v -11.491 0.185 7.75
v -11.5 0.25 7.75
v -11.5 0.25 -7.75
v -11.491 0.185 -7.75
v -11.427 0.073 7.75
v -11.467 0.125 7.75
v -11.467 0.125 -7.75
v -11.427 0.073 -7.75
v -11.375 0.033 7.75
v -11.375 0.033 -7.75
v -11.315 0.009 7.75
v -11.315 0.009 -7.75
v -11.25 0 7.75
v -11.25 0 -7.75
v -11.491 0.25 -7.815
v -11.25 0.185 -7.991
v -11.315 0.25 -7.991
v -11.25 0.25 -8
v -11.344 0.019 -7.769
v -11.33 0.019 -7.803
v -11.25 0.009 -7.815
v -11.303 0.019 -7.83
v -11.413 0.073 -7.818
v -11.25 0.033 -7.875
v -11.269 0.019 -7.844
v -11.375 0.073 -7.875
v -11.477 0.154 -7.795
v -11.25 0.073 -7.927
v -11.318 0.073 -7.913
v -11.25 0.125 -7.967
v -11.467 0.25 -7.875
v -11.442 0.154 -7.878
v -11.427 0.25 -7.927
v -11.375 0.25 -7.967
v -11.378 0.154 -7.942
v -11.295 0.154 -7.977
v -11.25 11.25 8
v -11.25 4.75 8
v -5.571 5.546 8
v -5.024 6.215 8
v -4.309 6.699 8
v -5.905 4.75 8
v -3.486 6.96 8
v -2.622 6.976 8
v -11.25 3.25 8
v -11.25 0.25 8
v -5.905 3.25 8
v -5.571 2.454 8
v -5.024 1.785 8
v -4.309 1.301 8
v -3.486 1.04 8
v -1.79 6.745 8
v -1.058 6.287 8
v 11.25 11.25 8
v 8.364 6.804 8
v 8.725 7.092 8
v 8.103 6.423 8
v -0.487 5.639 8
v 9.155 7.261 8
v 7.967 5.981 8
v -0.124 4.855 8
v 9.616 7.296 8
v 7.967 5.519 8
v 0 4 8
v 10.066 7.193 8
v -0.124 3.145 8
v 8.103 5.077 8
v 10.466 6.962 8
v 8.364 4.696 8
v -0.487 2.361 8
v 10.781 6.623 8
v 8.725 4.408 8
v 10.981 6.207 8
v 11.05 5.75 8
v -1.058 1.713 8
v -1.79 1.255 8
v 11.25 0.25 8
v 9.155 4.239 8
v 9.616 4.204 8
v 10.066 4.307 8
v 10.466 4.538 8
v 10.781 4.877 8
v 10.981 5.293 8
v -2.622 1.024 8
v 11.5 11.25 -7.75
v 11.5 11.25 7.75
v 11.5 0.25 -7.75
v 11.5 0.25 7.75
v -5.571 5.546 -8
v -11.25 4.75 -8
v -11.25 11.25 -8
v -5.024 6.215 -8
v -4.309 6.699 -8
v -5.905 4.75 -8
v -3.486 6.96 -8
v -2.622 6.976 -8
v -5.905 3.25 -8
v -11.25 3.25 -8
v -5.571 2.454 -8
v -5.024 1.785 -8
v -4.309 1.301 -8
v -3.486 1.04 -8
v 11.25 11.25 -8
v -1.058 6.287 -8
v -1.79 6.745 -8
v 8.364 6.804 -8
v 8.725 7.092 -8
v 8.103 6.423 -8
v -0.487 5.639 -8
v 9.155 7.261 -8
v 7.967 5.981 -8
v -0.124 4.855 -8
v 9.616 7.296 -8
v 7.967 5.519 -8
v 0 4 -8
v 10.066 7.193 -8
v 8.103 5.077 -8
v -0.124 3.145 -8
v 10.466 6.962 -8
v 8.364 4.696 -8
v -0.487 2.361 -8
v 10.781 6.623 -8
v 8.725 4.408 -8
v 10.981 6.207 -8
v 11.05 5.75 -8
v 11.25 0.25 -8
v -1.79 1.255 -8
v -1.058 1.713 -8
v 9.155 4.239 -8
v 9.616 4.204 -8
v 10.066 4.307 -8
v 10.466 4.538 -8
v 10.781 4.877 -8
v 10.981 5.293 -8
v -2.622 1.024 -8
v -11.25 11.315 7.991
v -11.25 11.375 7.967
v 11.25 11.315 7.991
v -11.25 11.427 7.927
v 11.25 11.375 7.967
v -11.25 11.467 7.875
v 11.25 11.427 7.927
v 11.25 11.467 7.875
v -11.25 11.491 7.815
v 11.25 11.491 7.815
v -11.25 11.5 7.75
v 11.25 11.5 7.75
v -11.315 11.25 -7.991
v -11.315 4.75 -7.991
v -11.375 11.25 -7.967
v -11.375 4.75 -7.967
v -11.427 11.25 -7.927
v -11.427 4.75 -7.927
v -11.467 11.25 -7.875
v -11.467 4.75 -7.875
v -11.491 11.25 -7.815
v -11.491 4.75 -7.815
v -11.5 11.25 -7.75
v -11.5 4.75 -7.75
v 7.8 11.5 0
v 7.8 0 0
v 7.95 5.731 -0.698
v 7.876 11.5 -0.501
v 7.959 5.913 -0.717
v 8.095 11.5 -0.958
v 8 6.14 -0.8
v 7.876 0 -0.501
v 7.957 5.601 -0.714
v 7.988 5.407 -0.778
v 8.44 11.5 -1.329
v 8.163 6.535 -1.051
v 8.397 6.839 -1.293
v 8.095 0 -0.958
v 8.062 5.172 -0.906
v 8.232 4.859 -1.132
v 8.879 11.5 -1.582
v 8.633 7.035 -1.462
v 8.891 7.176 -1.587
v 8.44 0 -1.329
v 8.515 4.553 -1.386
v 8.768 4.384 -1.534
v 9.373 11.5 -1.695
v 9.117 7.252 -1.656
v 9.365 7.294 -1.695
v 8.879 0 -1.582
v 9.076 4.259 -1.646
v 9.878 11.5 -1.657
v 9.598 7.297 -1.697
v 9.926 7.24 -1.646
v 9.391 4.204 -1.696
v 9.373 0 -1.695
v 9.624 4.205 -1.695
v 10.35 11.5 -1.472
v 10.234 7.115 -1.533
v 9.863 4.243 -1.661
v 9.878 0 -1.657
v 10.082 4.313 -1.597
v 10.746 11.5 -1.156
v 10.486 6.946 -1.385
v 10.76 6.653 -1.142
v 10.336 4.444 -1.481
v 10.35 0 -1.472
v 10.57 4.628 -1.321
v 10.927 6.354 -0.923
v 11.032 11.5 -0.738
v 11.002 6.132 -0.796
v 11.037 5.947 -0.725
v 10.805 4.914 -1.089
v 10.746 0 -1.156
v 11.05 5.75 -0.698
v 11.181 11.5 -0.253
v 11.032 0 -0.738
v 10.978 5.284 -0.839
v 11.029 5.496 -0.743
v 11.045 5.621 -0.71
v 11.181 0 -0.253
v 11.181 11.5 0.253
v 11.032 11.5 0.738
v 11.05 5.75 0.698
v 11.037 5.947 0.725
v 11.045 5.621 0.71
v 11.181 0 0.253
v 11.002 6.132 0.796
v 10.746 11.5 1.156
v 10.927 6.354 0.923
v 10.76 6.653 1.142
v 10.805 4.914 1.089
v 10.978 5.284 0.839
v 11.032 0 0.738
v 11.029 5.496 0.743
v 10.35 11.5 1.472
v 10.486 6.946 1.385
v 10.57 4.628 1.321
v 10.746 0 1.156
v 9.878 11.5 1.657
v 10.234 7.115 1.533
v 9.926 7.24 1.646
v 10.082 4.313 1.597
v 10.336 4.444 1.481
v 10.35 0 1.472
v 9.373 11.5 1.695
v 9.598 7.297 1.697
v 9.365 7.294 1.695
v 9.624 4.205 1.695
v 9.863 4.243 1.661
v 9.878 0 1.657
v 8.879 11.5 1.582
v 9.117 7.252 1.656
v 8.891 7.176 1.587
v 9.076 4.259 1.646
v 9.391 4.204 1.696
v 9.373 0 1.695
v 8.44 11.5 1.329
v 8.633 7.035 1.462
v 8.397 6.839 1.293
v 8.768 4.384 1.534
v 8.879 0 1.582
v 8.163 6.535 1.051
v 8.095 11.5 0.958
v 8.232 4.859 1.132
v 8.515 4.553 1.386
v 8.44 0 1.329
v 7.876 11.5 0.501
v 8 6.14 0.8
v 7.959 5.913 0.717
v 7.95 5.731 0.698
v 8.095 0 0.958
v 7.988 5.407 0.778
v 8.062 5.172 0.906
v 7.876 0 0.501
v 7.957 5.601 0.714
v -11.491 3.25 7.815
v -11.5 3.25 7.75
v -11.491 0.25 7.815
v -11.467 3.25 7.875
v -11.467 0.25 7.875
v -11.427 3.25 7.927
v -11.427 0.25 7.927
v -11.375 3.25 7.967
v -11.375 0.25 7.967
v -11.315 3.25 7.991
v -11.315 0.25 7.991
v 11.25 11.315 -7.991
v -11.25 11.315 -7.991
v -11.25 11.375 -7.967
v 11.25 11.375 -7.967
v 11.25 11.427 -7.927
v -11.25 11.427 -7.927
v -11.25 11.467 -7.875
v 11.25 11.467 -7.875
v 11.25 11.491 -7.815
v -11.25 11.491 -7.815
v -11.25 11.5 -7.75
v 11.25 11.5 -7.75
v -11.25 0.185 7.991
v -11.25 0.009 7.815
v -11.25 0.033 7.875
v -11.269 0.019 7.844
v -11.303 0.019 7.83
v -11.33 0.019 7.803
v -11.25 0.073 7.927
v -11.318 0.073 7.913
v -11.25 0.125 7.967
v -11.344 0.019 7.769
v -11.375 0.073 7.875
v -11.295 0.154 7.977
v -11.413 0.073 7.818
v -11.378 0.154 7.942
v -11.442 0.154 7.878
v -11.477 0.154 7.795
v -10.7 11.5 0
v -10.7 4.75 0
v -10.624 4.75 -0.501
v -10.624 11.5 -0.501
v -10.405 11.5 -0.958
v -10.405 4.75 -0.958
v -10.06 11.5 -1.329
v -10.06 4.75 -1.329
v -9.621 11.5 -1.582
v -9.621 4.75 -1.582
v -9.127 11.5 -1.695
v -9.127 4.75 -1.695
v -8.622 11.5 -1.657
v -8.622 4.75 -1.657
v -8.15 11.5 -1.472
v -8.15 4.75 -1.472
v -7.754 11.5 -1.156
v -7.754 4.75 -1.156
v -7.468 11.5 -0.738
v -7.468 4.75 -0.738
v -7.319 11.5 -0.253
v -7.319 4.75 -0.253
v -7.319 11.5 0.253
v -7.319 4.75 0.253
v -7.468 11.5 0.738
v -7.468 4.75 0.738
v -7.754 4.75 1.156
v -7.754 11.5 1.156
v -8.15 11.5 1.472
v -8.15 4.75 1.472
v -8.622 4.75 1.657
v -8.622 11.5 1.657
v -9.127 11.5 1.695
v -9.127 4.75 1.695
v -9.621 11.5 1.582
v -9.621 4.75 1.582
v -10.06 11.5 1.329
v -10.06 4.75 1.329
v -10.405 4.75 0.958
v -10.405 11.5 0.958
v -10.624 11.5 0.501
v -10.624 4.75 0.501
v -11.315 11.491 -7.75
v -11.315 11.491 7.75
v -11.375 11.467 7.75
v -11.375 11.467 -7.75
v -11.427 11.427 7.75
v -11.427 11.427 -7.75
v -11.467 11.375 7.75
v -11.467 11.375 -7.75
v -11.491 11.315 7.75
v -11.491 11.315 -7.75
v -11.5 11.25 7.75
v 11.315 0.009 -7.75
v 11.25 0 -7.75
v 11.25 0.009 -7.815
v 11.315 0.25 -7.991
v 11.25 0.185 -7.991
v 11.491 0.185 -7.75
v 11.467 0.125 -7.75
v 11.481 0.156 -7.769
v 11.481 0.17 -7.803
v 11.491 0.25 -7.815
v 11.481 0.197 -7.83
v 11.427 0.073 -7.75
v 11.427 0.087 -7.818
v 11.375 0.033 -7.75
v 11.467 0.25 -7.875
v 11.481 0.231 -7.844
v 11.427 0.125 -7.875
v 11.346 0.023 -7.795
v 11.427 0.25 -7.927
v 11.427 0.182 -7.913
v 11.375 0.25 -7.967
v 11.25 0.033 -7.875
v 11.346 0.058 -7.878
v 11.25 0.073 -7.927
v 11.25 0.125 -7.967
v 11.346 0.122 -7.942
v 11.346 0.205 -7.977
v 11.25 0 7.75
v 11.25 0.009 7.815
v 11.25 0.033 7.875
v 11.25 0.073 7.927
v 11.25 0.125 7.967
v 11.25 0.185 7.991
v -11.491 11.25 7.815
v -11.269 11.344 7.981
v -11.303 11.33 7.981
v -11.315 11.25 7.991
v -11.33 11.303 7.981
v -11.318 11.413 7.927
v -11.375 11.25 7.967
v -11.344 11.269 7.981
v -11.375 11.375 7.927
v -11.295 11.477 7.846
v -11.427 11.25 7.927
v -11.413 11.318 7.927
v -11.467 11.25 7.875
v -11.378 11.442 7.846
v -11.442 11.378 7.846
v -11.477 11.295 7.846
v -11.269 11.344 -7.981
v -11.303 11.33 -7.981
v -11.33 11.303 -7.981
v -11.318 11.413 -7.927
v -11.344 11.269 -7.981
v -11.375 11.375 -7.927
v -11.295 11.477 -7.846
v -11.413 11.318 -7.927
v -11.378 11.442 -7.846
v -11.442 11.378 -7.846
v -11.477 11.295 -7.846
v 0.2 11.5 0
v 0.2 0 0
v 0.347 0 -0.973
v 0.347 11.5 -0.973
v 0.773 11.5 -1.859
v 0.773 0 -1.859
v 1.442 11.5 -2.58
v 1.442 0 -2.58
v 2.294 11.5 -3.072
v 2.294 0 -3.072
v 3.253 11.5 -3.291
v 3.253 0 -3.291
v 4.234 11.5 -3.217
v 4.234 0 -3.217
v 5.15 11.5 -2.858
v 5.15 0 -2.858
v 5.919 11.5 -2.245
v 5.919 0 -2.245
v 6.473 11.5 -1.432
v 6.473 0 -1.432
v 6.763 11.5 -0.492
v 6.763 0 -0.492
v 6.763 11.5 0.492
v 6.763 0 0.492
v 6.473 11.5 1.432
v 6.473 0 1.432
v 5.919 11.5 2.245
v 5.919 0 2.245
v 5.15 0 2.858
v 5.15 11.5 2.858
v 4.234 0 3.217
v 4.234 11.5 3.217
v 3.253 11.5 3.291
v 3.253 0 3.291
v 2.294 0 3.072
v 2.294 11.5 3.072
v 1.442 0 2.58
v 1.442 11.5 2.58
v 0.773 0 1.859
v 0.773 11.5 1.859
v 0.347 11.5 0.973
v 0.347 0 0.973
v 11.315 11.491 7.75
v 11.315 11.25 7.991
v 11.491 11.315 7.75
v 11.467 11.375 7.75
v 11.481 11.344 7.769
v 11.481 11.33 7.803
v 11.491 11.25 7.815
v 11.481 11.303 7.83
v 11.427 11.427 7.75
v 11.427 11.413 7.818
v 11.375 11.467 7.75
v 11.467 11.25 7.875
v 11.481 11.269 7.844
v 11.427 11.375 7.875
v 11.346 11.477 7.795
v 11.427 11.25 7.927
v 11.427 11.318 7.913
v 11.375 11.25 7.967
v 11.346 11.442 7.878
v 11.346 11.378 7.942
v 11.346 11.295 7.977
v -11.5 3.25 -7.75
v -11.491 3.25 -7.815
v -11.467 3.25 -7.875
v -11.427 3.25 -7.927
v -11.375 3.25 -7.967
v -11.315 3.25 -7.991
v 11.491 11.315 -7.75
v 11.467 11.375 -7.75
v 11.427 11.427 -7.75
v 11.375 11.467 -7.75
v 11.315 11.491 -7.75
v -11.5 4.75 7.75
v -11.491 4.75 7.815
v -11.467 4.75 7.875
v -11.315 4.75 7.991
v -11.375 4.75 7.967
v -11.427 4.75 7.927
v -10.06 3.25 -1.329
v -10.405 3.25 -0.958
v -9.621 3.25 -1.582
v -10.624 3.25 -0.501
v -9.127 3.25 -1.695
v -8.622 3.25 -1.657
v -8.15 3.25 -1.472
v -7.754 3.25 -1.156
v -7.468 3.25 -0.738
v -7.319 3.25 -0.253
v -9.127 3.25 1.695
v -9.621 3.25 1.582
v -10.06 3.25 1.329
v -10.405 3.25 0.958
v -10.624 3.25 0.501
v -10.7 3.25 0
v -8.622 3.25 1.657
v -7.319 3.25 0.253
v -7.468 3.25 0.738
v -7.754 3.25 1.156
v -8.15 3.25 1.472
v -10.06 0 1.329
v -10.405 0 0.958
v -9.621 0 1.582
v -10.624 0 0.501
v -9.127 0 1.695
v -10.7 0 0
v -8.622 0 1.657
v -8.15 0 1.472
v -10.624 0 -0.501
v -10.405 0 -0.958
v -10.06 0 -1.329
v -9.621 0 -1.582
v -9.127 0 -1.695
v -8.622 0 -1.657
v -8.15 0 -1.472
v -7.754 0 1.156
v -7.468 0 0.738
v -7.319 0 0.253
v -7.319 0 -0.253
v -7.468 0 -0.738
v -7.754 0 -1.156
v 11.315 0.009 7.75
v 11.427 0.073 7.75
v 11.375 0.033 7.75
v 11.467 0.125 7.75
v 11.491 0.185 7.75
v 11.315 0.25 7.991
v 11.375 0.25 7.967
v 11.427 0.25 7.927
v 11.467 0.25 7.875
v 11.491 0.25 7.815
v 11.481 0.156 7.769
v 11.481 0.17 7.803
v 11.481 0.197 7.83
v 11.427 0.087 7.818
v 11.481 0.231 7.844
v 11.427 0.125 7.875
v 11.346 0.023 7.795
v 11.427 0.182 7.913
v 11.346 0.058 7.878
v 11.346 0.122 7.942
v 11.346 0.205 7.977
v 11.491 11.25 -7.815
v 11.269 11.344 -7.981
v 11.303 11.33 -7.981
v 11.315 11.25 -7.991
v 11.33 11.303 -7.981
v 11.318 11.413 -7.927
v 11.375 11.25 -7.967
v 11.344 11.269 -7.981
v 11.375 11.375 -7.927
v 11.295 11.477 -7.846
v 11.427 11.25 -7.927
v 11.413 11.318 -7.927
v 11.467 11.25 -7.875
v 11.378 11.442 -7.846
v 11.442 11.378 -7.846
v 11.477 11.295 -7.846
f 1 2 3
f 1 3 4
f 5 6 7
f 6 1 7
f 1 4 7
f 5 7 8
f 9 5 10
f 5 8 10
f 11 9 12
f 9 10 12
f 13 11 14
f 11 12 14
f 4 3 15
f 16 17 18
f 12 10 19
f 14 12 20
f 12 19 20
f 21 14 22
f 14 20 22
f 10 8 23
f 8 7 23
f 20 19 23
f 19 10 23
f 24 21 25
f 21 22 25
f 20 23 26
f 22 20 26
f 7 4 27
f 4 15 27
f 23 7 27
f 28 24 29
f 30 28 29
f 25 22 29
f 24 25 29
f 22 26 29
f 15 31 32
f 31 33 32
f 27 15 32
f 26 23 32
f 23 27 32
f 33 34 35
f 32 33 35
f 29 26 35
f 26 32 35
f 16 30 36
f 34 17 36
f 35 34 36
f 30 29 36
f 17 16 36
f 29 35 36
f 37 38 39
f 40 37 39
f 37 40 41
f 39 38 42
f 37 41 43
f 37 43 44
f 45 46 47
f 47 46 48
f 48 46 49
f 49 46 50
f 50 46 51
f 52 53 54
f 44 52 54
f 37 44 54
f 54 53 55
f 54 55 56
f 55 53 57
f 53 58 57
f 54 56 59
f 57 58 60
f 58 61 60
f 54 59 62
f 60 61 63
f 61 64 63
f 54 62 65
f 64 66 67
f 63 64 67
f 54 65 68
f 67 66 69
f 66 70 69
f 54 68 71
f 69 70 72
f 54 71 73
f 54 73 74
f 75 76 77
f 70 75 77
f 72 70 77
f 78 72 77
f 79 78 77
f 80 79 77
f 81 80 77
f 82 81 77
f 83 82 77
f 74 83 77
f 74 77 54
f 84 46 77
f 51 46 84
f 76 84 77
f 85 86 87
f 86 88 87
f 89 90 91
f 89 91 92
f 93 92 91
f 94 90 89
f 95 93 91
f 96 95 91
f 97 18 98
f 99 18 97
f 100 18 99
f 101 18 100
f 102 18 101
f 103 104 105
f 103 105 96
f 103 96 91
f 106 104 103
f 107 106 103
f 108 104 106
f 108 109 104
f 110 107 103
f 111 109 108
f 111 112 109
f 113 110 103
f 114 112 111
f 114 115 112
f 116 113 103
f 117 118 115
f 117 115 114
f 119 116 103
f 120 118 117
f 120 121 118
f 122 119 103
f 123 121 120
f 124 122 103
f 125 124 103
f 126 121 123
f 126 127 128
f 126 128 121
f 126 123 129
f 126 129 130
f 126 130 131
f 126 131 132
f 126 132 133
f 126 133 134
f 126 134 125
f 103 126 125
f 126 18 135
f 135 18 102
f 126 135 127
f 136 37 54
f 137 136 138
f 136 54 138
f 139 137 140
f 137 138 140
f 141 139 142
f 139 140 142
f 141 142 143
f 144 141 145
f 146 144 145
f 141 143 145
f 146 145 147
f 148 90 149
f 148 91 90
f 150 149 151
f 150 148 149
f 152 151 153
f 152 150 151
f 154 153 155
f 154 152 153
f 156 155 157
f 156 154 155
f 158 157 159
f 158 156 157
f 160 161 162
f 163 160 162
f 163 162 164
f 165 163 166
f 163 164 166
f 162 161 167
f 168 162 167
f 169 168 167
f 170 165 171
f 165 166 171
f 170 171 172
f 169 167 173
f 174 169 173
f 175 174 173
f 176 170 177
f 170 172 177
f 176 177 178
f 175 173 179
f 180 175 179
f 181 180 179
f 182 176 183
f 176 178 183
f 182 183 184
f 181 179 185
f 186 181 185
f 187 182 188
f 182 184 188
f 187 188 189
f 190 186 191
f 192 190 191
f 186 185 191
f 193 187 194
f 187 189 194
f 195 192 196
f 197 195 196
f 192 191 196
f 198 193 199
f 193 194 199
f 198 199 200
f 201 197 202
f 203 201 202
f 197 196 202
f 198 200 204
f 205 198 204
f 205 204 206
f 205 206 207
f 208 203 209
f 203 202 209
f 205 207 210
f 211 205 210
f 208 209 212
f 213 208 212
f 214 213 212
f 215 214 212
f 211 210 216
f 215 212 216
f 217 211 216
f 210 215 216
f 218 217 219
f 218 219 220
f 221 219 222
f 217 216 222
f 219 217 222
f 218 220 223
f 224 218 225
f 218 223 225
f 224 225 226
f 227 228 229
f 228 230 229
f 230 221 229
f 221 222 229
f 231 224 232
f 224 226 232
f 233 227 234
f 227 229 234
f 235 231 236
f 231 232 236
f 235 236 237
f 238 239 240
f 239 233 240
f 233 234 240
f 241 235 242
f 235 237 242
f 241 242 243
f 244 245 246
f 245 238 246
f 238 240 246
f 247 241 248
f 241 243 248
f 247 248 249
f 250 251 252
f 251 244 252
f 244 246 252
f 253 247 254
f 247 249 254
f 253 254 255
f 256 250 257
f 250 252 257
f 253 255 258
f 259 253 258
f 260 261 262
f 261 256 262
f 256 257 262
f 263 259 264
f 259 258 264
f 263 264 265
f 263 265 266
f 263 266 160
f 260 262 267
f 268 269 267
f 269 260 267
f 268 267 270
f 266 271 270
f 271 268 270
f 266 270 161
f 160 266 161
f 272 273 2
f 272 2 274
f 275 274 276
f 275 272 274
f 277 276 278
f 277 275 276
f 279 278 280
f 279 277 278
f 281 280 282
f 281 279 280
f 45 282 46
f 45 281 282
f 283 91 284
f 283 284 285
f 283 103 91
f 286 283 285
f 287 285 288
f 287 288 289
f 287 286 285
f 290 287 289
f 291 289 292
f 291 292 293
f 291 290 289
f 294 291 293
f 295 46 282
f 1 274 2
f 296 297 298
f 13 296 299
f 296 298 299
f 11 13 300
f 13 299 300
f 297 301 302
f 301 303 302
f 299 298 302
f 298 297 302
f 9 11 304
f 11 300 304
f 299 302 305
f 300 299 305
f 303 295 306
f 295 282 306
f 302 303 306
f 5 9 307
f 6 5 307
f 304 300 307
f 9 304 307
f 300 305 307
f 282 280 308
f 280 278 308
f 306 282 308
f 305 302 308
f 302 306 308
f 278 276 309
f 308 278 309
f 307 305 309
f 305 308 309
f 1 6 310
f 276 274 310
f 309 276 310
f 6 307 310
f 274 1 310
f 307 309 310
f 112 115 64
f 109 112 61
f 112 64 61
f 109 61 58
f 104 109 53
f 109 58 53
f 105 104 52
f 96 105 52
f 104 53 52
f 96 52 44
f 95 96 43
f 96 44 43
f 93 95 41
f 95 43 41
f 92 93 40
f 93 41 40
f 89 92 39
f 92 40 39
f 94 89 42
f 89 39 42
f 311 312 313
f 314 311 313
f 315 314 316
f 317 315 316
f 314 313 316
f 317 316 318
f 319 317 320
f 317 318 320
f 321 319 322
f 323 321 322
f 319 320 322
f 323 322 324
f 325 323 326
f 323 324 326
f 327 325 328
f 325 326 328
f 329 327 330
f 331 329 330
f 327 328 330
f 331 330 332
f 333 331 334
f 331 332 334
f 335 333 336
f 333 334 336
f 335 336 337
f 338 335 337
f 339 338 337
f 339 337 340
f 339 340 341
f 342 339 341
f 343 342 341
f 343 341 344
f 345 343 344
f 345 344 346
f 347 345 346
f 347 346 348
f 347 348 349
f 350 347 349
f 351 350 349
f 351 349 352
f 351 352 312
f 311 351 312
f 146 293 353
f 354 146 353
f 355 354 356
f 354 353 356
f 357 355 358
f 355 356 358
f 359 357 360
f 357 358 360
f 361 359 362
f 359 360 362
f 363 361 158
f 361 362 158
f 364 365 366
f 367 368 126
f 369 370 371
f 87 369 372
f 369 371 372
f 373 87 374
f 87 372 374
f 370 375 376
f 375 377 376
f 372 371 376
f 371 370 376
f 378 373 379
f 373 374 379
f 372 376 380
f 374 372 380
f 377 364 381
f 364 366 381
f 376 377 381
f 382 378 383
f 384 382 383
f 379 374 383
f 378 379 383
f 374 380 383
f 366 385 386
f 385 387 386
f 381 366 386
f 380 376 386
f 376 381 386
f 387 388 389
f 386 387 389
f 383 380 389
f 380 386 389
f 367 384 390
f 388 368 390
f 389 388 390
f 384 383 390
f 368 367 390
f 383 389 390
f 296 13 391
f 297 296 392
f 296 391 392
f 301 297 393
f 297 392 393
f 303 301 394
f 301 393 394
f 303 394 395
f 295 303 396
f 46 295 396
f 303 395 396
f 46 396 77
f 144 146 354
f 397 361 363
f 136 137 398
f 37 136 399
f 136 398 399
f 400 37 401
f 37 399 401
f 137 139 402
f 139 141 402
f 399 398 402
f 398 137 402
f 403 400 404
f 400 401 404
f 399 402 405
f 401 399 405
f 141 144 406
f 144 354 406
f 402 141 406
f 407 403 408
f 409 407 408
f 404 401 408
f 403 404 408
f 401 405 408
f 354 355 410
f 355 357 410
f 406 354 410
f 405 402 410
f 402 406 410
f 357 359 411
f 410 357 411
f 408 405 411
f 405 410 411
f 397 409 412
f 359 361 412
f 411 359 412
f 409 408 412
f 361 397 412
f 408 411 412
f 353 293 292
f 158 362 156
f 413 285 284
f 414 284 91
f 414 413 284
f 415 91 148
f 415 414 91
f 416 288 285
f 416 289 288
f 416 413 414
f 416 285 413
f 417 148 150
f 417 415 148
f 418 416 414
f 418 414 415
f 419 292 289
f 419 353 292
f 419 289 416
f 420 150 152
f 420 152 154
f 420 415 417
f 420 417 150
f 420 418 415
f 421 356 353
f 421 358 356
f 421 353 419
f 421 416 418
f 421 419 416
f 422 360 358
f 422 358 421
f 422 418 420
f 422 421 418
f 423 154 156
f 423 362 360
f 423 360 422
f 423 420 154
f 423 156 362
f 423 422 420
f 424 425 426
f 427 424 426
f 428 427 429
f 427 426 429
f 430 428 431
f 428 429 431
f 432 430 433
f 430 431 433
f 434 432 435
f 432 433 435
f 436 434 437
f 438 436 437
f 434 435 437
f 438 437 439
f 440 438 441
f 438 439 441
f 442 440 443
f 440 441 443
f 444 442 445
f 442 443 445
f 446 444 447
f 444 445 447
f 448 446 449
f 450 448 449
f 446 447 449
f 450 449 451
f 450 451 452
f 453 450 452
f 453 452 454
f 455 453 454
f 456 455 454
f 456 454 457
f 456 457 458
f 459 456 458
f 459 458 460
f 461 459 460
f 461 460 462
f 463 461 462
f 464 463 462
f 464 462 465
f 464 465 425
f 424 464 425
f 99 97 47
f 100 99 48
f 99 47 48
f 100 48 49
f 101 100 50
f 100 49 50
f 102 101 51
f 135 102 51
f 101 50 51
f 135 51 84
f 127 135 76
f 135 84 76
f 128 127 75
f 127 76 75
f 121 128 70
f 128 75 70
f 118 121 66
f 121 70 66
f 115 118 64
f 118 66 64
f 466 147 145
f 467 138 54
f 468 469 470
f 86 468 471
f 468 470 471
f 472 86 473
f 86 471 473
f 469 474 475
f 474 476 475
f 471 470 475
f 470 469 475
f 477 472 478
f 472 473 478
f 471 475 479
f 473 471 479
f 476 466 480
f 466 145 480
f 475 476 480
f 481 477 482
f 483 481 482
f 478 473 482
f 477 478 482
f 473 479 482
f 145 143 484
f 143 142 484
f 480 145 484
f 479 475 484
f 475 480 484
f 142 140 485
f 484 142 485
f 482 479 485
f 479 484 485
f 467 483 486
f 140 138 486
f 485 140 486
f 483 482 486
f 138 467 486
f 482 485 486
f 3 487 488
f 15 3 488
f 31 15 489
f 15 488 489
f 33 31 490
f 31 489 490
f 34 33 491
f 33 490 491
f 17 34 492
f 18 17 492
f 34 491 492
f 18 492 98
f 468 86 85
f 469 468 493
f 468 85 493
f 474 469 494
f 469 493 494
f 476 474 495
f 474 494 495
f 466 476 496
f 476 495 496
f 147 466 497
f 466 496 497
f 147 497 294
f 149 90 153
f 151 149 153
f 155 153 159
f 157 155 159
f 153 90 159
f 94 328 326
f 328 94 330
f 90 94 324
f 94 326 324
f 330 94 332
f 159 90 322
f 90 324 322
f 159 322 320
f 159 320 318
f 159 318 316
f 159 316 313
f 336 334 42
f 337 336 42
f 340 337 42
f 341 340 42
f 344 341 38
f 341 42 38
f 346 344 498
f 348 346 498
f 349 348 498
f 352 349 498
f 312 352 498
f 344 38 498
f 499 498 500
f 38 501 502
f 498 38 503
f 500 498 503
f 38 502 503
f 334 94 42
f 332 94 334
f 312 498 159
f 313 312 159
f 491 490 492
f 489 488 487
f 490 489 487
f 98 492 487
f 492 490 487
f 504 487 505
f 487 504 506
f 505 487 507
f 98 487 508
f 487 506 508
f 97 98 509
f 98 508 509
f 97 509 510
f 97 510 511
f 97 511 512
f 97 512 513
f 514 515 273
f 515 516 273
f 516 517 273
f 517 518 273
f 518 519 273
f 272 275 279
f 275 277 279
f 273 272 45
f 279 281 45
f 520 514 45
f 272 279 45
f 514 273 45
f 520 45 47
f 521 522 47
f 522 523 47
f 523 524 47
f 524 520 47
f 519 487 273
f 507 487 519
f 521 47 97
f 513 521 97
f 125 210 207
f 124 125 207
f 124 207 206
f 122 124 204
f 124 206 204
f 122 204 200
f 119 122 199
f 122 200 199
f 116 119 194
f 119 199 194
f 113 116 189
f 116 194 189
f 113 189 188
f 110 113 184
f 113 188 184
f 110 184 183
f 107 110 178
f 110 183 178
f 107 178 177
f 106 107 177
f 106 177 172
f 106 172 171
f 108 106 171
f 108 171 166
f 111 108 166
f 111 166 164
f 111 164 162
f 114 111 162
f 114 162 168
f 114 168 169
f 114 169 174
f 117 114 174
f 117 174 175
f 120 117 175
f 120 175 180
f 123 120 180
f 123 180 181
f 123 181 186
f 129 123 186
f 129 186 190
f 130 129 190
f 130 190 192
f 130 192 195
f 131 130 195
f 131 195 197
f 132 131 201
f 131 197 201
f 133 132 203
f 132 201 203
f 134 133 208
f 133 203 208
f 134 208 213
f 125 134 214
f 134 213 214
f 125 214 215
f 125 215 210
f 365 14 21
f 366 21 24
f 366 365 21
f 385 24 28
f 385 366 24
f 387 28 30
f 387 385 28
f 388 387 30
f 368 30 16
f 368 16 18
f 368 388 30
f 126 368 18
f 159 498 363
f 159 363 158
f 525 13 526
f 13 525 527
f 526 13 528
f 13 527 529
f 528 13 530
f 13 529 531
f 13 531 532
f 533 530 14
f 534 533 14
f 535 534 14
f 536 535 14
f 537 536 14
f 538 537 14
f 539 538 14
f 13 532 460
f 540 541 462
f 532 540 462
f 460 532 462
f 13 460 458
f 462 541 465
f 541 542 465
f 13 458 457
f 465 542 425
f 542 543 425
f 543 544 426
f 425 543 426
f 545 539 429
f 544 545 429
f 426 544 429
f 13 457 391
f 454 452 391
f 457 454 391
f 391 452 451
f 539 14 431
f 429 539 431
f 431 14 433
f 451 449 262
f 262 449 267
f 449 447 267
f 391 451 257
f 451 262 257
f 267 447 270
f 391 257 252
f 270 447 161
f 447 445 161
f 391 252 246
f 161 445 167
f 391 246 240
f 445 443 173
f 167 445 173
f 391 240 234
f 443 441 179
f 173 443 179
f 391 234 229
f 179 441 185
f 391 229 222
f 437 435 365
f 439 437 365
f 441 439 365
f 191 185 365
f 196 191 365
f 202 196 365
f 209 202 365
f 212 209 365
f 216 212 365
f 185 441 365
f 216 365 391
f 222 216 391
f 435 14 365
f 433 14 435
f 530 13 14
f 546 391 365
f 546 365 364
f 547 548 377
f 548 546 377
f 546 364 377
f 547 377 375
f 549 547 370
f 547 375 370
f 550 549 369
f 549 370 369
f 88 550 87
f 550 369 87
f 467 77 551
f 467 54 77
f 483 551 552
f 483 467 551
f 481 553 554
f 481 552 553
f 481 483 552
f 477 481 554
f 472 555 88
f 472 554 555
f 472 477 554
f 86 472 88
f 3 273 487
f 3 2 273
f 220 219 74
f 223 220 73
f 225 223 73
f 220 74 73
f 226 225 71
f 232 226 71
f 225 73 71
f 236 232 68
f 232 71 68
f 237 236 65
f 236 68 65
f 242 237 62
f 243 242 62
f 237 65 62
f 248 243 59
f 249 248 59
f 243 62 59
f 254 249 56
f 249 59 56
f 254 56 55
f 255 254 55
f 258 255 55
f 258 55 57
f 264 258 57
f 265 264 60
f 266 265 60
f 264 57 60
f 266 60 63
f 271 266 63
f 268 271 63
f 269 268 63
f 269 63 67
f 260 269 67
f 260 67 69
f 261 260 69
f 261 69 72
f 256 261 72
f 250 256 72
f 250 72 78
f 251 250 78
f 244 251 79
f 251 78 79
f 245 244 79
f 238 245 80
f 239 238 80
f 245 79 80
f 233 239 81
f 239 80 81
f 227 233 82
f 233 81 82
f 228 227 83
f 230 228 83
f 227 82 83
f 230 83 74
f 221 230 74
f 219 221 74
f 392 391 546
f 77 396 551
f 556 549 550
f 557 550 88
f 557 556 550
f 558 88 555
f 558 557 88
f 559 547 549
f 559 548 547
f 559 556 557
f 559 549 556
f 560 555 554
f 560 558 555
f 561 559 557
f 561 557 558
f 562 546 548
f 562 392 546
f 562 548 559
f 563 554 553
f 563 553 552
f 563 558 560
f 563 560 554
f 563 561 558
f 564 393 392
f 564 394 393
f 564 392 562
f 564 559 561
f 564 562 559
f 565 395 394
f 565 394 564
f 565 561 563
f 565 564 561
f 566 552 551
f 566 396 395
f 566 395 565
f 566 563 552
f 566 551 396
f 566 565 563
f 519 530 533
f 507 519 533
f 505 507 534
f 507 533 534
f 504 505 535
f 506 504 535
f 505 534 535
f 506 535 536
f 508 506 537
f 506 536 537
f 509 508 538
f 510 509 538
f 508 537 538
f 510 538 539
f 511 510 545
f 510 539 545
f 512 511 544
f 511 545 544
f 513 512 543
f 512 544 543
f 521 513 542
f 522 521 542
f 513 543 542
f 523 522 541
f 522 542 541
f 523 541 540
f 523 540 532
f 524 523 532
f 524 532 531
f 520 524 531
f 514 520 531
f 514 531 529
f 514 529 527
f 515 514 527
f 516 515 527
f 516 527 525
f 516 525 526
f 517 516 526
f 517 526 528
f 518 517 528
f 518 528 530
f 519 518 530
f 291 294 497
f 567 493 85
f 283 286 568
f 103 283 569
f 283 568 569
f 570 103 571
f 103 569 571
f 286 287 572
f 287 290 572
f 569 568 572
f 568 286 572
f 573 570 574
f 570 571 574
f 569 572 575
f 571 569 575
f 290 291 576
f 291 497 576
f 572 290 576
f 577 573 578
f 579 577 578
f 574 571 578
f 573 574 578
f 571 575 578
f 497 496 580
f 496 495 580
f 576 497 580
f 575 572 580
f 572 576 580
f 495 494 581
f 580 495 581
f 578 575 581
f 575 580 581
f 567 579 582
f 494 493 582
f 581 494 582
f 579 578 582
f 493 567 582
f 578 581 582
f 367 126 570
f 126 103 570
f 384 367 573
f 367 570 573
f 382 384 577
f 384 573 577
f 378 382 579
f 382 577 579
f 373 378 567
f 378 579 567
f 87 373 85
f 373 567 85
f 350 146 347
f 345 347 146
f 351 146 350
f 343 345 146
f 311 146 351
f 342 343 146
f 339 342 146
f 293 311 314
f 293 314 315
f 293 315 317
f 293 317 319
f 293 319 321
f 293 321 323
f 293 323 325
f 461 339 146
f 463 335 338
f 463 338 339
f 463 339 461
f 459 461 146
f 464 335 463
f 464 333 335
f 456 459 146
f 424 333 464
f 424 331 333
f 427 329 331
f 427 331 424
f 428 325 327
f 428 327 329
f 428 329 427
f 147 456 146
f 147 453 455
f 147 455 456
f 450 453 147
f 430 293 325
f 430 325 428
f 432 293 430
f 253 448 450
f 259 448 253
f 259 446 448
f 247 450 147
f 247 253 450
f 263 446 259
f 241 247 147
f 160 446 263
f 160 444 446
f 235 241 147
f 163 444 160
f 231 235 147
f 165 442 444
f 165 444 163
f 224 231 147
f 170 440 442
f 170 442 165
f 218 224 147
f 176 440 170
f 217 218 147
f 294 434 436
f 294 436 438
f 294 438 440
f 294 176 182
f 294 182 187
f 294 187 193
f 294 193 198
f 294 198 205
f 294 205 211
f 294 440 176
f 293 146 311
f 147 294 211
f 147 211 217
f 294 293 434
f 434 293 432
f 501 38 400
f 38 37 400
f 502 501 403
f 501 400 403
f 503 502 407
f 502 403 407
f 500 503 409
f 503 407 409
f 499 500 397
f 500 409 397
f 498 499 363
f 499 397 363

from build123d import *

# Parameters (mm, degrees)
SKETCH1_W            = 23
SKETCH1_H            = 16
BOSS_EXTRUDE1_DEPTH  = 11.5
M6_CLEARANCE_HOLE3_D = 6.6
M3_CLEARANCE_HOLE1_D = 3.4
SKETCH9_R            = 1.55
CUT_EXTRUDE1_DEPTH   = 23.814469093
FILLET1_R            = 0.25


with BuildPart() as part:
    # Sketch1 → Boss-Extrude1 (new body)
    with BuildSketch(Plane(origin=(0, 0, 0), x_dir=(1, 0, 0), z_dir=(0, 1, 0))):
        Rectangle(SKETCH1_W, SKETCH1_H)
    extrude(amount=BOSS_EXTRUDE1_DEPTH)

    # M6 Clearance Hole3 (through all)
    with Locations(Plane(origin=(0, 11.5, 0), x_dir=(1, 0, 0), z_dir=(0, 1, 0))):
        with Locations((3.5, 0)):
            Hole(M6_CLEARANCE_HOLE3_D / 2)

    # M3 Clearance Hole1 (through all)
    with Locations(Plane(origin=(0, 11.5, 0), x_dir=(1, 0, 0), z_dir=(0, 1, 0))):
        with Locations((-9, 0), (9.5, 0)):
            Hole(M3_CLEARANCE_HOLE1_D / 2)

    # Sketch9 → Cut-Extrude1 (cut, through all)
    with BuildSketch(Plane.XY.offset(8)):
        with BuildLine():
            ThreePointArc((-5.90473751, 3.25), (-6, 4), (-5.90473751, 4.75))
            Line((-5.90473751, 4.75), (-11.5, 4.75))
            Line((-11.5, 4.75), (-11.5, 3.25))
            Line((-11.5, 3.25), (-5.90473751, 3.25))
        make_face()
        with BuildLine():
            ThreePointArc((0, 4), (-2.621987123, 6.976089089), (-5.90473751, 4.75))
            Line((-5.90473751, 4.75), (-5.90473751, 3.25))
            ThreePointArc((-5.90473751, 3.25), (-2.621987123, 1.023910911), (0, 4))
        make_face()
        with BuildLine():
            Line((-5.90473751, 3.25), (-5.90473751, 4.75))
            ThreePointArc((-5.90473751, 4.75), (-6, 4), (-5.90473751, 3.25))
        make_face()
        with Locations((9.5, 5.75)):
            Circle(SKETCH9_R)
    extrude(amount=-CUT_EXTRUDE1_DEPTH, mode=Mode.SUBTRACT)

    # Fillet1
    fillet1_edges = [part.edges().sort_by_distance(p)[0] for p in [
        (-11.5, 11.5, 0),
        (0, 11.5, 8),
        (-11.5, 1.625, 8),
        (-11.5, 1.625, -8),
        (11.5, 11.5, 0),
        (0, 0, 8),
        (-11.5, 0, 0),
        (0, 0, -8),
        (11.5, 0, 0),
        (0, 11.5, -8),
        (11.5, 5.75, 8),
        (-11.5, 8.125, 8),
        (-11.5, 8.125, -8),
        (11.5, 5.75, -8),
    ]]
    fillet(fillet1_edges, radius=FILLET1_R)


solid = part.part
